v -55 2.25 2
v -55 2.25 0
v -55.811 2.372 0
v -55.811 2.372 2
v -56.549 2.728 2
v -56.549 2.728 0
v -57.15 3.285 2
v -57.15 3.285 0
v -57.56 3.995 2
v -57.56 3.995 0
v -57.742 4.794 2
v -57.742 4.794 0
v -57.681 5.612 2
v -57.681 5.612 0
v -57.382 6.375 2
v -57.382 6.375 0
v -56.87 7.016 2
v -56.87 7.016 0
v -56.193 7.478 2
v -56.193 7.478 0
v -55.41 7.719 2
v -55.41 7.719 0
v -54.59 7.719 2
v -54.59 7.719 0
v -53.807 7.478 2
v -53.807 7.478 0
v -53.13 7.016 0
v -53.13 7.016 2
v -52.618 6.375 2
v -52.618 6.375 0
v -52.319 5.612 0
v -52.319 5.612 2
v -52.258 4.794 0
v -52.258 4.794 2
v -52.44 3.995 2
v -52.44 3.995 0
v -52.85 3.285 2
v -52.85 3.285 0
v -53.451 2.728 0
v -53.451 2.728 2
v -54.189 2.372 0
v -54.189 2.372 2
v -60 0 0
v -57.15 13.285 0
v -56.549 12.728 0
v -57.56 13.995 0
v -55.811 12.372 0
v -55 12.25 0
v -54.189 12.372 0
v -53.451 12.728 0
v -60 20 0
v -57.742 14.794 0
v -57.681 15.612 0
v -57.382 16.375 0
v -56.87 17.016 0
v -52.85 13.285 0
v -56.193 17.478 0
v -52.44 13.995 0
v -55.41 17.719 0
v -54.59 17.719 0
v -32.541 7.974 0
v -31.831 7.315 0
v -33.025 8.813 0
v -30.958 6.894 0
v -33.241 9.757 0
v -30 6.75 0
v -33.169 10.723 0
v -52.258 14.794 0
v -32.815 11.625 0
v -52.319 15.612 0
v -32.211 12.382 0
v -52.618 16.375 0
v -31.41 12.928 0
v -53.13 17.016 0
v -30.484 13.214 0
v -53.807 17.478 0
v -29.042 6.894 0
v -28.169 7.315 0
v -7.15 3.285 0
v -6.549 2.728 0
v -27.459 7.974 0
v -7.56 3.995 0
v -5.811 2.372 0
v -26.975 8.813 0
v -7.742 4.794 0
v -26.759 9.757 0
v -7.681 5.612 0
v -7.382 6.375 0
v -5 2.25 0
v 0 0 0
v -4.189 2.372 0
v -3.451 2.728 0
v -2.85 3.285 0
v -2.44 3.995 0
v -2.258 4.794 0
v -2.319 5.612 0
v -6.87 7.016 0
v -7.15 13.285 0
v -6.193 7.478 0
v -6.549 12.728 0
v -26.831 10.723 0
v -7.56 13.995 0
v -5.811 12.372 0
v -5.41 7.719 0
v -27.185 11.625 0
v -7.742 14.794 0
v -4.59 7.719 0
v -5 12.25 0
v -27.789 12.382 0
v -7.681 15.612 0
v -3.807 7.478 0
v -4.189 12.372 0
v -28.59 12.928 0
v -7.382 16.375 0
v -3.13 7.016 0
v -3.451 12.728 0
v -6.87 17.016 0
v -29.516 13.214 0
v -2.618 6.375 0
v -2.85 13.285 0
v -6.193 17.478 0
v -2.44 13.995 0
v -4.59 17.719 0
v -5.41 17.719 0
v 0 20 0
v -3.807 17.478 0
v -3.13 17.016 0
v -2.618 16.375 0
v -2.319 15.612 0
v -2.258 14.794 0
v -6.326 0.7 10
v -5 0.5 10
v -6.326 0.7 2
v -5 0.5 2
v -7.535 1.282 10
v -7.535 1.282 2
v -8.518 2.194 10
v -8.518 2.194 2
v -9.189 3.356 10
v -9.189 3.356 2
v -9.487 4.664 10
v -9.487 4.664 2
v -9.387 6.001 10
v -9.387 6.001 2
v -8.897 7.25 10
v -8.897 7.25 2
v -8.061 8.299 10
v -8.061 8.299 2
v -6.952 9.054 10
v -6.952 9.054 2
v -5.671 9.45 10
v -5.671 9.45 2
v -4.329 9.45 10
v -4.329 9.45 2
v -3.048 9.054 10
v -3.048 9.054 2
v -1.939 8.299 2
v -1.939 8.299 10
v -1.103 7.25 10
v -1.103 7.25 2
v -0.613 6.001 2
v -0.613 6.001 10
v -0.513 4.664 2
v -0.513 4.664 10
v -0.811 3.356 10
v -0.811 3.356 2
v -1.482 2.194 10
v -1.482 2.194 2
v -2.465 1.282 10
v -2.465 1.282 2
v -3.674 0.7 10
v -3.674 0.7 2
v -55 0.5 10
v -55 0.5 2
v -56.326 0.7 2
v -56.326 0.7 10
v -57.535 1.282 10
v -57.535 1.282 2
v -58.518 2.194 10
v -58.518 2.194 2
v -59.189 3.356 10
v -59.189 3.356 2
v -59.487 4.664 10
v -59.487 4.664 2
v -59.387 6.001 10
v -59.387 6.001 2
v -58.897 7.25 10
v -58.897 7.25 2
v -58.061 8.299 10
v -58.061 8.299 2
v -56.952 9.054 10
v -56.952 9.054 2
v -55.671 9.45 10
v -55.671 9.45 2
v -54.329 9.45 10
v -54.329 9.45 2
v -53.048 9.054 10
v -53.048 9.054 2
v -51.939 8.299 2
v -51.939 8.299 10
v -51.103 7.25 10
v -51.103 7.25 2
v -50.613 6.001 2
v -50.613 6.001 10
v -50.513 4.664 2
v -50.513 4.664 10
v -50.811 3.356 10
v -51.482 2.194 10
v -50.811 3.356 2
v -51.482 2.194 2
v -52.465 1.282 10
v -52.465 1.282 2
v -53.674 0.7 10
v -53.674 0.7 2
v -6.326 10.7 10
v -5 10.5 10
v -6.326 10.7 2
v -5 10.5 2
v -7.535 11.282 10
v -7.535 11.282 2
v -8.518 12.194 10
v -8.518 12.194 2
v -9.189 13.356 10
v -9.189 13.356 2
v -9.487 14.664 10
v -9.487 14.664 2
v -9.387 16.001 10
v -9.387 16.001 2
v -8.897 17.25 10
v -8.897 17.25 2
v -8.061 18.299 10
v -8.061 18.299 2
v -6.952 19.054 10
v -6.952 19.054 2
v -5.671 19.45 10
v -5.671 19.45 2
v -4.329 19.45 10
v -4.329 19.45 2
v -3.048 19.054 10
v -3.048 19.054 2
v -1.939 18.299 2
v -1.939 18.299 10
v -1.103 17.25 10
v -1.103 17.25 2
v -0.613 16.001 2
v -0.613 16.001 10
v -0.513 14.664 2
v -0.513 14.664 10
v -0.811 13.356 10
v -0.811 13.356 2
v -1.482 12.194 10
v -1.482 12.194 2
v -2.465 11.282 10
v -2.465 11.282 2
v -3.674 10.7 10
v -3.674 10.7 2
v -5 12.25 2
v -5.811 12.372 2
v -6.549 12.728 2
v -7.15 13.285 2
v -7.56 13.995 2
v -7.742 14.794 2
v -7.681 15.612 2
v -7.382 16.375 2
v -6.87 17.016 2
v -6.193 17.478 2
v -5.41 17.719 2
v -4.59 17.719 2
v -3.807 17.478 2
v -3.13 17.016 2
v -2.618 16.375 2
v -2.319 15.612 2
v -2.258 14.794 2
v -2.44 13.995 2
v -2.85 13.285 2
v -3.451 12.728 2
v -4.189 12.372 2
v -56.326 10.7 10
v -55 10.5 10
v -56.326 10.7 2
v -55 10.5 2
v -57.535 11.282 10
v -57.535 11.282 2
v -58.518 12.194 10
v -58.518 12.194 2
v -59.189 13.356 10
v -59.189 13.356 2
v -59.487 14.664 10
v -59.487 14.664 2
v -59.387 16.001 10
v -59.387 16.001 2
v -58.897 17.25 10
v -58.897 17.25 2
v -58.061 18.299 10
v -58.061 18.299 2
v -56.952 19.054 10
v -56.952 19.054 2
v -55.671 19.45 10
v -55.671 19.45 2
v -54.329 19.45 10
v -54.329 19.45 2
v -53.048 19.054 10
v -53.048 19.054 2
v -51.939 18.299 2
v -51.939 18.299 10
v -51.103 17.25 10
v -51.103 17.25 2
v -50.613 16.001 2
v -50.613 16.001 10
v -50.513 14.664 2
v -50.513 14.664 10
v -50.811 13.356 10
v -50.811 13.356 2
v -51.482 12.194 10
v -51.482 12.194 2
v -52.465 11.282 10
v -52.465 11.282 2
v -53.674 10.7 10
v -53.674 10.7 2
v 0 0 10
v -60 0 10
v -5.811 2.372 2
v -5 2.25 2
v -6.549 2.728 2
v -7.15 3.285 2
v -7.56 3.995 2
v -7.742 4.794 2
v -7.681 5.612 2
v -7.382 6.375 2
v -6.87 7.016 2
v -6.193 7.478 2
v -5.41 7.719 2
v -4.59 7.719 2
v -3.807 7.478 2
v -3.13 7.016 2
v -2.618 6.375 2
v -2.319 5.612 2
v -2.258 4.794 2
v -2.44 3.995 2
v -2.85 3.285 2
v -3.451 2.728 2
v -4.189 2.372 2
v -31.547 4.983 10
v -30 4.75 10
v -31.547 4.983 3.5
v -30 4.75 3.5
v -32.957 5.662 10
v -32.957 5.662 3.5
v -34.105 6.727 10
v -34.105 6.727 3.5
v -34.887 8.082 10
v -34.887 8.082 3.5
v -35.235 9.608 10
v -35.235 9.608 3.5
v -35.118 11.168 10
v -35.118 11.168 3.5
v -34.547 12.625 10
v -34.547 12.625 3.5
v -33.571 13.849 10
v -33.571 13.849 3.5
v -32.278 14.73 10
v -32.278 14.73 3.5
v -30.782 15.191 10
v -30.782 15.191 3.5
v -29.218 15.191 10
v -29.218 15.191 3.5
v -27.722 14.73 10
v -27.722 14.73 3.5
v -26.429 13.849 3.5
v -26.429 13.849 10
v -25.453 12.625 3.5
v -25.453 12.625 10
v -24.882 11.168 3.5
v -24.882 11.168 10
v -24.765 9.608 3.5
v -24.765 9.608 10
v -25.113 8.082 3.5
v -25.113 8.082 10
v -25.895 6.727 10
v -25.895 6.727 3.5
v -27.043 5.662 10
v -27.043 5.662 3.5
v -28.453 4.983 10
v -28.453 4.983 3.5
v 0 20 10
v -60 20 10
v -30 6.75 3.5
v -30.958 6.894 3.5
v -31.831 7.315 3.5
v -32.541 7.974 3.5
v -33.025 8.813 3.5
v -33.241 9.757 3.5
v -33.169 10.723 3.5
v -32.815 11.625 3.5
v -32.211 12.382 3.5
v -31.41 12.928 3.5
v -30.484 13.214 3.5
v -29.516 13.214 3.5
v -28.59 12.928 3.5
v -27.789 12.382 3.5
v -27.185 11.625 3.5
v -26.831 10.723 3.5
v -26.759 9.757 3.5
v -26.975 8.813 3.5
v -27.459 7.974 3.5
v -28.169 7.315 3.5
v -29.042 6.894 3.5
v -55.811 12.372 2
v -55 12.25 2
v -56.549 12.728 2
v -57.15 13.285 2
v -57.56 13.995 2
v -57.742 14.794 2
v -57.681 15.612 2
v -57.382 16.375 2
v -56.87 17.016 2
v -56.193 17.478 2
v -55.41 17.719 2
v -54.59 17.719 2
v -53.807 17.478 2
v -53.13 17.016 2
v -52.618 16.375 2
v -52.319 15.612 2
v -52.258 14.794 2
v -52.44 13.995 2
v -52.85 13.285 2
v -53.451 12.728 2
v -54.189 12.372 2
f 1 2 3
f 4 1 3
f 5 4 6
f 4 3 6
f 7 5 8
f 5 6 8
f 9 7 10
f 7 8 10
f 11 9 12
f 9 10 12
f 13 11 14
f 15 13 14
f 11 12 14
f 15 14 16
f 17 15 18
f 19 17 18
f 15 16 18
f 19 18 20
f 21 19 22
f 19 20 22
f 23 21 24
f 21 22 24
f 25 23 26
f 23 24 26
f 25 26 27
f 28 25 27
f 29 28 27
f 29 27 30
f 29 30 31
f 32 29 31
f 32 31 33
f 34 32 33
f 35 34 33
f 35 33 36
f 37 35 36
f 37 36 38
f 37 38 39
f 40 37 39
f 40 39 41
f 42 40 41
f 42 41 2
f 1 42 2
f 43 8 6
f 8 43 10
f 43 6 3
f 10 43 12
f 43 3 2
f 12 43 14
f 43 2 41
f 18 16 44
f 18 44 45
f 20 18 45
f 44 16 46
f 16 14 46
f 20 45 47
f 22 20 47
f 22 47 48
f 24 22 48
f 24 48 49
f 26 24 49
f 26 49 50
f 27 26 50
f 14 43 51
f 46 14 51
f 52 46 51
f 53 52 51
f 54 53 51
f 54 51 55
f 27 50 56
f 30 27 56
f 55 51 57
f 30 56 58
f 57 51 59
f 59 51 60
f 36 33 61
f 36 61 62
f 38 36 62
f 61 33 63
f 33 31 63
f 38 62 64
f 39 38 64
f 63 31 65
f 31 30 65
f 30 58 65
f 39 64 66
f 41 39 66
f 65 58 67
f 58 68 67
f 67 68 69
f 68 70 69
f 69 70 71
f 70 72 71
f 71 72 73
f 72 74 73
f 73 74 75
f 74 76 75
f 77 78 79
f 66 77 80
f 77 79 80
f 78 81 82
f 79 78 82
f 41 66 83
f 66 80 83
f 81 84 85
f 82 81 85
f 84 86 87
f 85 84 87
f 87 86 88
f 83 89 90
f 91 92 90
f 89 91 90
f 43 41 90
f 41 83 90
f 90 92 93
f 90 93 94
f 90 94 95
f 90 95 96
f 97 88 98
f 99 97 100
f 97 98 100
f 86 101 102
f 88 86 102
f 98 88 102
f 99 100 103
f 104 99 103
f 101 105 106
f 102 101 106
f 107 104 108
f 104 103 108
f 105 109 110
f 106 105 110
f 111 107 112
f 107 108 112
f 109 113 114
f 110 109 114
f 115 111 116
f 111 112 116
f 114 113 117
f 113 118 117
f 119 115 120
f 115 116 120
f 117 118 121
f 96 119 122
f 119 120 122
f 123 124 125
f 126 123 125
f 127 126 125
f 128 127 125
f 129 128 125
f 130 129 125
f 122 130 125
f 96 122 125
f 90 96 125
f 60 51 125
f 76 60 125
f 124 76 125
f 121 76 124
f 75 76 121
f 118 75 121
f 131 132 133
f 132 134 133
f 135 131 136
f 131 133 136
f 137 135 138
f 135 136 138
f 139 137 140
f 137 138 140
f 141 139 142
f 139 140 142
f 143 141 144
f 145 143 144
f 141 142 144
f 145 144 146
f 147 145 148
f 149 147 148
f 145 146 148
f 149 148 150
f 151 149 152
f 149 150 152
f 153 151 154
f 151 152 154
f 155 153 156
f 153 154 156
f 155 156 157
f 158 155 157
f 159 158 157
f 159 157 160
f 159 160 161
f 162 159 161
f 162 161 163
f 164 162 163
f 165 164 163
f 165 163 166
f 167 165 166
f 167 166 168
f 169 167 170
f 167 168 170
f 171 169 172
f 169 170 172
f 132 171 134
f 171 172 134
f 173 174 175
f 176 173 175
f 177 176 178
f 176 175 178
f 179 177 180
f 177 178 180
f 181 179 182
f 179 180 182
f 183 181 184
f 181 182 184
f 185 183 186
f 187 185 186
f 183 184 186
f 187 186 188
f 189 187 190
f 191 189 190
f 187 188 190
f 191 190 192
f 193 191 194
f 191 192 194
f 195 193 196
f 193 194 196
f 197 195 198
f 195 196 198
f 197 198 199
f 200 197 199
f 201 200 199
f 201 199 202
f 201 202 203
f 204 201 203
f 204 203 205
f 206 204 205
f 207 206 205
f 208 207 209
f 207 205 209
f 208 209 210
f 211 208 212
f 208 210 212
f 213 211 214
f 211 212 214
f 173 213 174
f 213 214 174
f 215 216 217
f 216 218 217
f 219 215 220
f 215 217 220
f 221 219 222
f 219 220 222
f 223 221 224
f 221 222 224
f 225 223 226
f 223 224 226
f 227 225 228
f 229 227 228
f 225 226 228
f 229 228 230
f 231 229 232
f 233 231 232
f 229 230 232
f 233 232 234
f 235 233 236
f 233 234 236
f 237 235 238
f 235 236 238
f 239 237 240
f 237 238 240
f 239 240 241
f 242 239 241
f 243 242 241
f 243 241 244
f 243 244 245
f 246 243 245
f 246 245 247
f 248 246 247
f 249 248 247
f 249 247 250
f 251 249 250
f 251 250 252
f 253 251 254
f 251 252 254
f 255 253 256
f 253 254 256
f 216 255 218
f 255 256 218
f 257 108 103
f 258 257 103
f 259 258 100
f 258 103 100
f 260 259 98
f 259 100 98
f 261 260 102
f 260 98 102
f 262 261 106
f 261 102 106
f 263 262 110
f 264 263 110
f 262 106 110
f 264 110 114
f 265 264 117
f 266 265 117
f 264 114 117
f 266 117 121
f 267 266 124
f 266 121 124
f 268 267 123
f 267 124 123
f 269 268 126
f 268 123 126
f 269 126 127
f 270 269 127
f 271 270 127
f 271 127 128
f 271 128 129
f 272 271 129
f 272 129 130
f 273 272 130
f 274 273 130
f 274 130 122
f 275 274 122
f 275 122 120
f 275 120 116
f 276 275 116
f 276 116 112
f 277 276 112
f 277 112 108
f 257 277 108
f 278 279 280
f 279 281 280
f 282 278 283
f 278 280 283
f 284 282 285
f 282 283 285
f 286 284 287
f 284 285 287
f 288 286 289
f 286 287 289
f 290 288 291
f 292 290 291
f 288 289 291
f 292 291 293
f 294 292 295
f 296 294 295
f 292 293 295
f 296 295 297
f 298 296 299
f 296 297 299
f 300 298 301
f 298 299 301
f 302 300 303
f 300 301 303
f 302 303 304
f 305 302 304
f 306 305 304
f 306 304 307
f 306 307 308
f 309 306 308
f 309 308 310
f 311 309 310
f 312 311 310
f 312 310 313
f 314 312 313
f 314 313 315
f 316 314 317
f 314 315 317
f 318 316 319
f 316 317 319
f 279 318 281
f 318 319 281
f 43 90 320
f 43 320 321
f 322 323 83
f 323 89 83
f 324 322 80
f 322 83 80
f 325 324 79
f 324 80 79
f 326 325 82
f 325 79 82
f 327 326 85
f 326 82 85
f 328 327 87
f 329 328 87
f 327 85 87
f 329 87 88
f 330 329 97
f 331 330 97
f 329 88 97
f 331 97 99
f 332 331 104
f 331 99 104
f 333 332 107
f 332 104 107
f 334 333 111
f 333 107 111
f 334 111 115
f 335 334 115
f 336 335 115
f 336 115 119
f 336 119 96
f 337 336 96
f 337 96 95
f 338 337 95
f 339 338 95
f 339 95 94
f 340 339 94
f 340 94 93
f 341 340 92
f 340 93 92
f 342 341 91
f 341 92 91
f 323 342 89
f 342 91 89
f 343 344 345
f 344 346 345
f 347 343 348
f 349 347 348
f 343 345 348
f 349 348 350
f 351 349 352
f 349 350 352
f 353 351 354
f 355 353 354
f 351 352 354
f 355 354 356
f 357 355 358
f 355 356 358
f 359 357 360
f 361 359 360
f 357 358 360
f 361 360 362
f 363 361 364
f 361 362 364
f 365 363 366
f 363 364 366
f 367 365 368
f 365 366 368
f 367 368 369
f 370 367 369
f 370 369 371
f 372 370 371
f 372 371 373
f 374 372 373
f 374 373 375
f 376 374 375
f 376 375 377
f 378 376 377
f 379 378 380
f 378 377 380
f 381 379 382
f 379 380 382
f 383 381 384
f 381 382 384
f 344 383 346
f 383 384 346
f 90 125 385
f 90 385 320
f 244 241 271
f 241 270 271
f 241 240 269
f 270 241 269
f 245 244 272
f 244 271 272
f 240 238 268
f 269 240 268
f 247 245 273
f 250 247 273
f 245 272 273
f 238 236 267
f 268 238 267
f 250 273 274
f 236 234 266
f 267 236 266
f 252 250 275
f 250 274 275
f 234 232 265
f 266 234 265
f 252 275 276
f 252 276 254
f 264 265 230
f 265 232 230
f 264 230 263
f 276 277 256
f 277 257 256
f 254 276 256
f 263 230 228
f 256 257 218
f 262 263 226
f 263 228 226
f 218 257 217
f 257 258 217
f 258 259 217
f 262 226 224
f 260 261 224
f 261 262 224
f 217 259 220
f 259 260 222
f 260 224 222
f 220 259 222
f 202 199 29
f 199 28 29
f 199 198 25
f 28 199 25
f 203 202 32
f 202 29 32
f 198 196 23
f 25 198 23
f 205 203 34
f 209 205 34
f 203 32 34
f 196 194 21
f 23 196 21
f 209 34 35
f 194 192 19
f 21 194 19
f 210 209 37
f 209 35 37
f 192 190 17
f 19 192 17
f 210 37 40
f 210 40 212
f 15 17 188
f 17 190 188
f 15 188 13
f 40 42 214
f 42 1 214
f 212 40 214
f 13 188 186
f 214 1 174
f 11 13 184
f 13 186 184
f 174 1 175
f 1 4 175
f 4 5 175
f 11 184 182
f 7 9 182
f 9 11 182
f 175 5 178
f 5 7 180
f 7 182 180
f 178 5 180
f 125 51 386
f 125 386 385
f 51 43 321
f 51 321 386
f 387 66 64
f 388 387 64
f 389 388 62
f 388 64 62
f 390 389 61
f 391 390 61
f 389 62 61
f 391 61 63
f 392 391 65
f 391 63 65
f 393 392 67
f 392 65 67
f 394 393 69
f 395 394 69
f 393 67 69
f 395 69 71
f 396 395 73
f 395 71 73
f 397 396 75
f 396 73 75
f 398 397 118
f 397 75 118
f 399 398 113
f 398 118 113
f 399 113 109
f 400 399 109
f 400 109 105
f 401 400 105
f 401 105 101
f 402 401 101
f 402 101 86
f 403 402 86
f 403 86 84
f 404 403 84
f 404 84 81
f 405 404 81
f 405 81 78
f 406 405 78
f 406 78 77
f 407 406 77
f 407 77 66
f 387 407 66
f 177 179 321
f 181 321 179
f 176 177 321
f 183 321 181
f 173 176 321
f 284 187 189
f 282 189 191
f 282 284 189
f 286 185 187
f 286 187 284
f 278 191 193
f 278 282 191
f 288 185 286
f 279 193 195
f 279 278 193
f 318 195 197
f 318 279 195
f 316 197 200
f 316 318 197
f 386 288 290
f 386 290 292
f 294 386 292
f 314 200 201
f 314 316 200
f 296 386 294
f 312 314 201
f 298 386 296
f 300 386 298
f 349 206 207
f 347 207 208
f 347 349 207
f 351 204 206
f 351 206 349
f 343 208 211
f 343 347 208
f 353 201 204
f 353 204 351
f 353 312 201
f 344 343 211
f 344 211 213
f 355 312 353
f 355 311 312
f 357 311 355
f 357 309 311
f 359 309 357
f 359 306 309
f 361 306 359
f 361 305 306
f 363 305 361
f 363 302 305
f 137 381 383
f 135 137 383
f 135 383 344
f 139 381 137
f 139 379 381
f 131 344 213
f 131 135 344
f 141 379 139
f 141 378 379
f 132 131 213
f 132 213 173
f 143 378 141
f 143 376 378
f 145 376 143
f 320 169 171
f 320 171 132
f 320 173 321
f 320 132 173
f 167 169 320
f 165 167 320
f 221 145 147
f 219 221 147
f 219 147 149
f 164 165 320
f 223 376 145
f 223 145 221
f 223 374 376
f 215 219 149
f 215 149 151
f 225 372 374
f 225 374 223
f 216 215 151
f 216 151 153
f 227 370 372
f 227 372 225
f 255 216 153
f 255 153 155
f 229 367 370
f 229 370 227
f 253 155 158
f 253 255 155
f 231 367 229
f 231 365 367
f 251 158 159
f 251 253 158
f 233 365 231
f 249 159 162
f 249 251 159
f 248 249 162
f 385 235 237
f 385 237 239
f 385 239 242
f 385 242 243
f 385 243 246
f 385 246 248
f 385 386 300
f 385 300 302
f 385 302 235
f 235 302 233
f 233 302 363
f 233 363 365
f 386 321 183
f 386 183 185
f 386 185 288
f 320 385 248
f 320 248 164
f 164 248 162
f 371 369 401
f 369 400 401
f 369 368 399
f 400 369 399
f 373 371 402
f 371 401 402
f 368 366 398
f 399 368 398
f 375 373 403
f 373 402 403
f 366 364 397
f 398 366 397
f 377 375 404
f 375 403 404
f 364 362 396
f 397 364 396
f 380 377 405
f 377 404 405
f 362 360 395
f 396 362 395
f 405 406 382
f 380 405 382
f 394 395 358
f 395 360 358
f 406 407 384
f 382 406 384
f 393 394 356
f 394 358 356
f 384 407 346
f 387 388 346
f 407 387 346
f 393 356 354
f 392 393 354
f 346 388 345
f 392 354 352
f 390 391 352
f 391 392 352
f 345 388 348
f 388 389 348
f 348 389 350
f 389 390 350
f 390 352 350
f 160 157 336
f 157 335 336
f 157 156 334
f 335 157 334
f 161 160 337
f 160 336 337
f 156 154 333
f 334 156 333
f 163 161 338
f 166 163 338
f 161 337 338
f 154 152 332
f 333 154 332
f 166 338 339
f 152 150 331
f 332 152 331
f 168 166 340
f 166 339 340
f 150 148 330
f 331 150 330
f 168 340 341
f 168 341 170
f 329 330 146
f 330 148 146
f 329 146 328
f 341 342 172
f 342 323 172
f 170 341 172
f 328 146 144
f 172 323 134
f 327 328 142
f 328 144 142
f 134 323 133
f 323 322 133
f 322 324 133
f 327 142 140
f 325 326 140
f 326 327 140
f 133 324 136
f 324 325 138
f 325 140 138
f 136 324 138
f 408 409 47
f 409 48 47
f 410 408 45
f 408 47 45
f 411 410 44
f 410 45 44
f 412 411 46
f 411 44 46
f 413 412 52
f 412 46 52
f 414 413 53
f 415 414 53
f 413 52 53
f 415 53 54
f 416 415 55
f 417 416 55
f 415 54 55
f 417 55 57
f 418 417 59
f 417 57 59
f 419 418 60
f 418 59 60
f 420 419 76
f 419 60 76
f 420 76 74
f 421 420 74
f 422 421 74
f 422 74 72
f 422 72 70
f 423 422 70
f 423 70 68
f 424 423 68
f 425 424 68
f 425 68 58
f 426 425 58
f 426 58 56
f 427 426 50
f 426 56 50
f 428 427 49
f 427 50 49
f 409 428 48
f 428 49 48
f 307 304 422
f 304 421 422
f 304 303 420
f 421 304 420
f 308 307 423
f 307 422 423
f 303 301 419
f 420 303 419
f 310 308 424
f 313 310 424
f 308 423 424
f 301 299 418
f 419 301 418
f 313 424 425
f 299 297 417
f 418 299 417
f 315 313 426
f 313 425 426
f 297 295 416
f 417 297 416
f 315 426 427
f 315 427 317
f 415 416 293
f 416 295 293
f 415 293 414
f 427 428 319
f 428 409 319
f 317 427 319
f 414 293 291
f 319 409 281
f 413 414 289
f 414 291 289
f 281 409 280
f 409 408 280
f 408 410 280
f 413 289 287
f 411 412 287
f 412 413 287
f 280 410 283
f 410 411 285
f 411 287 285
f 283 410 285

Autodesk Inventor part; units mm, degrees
ref_plane "YZ Plane" through (0, 0, 0) normal (1, 0, 0) x (0, 1, 0)
ref_plane "XZ Plane" through (0, 0, 0) normal (0, 1, 0) x (-1, 0, 0)
ref_plane "XY Plane" through (0, 0, 0) normal (0, 0, 1) x (1, 0, 0)
sketch "Sketch4" plane through (0, 0, 0) normal (0, 0, 1) x (1, 0, 0)
  line L0 (0, 0) -> (-60, 0)
  line L1 (-60, 0) -> (-60, 20)
  line L2 (-60, 20) -> (0, 20)
  line L3 (0, 20) -> (0, 0)
  dimension "d37" = 60
  dimension "d38" = 20
extrude "Extrusion2" add sketch "Sketch4" along normal blind 10
hole "Hole2" at (-30, 10, 10) direction (0, 0, -1) diameter 6.5 depth 10 tip angle 118 counterbore diameter 10.5 counterbore depth 6.5
hole "Hole3" at (-55, 15, 10) direction (0, 0, -1) diameter 5.5 depth 10 tip angle 118 counterbore diameter 9 counterbore depth 8
hole "Hole4" at (-5, 15, 10) direction (0, 0, -1) diameter 5.5 depth 10 tip angle 118 counterbore diameter 9 counterbore depth 8
hole "Hole5" at (-5, 5, 10) direction (0, 0, -1) diameter 5.5 depth 10 tip angle 118 counterbore diameter 9 counterbore depth 8
hole "Hole6" at (-55, 5, 10) direction (0, 0, -1) diameter 5.5 depth 10 tip angle 118 counterbore diameter 9 counterbore depth 8
properties part number "GARFO" material "Aluminium AW-7020"
